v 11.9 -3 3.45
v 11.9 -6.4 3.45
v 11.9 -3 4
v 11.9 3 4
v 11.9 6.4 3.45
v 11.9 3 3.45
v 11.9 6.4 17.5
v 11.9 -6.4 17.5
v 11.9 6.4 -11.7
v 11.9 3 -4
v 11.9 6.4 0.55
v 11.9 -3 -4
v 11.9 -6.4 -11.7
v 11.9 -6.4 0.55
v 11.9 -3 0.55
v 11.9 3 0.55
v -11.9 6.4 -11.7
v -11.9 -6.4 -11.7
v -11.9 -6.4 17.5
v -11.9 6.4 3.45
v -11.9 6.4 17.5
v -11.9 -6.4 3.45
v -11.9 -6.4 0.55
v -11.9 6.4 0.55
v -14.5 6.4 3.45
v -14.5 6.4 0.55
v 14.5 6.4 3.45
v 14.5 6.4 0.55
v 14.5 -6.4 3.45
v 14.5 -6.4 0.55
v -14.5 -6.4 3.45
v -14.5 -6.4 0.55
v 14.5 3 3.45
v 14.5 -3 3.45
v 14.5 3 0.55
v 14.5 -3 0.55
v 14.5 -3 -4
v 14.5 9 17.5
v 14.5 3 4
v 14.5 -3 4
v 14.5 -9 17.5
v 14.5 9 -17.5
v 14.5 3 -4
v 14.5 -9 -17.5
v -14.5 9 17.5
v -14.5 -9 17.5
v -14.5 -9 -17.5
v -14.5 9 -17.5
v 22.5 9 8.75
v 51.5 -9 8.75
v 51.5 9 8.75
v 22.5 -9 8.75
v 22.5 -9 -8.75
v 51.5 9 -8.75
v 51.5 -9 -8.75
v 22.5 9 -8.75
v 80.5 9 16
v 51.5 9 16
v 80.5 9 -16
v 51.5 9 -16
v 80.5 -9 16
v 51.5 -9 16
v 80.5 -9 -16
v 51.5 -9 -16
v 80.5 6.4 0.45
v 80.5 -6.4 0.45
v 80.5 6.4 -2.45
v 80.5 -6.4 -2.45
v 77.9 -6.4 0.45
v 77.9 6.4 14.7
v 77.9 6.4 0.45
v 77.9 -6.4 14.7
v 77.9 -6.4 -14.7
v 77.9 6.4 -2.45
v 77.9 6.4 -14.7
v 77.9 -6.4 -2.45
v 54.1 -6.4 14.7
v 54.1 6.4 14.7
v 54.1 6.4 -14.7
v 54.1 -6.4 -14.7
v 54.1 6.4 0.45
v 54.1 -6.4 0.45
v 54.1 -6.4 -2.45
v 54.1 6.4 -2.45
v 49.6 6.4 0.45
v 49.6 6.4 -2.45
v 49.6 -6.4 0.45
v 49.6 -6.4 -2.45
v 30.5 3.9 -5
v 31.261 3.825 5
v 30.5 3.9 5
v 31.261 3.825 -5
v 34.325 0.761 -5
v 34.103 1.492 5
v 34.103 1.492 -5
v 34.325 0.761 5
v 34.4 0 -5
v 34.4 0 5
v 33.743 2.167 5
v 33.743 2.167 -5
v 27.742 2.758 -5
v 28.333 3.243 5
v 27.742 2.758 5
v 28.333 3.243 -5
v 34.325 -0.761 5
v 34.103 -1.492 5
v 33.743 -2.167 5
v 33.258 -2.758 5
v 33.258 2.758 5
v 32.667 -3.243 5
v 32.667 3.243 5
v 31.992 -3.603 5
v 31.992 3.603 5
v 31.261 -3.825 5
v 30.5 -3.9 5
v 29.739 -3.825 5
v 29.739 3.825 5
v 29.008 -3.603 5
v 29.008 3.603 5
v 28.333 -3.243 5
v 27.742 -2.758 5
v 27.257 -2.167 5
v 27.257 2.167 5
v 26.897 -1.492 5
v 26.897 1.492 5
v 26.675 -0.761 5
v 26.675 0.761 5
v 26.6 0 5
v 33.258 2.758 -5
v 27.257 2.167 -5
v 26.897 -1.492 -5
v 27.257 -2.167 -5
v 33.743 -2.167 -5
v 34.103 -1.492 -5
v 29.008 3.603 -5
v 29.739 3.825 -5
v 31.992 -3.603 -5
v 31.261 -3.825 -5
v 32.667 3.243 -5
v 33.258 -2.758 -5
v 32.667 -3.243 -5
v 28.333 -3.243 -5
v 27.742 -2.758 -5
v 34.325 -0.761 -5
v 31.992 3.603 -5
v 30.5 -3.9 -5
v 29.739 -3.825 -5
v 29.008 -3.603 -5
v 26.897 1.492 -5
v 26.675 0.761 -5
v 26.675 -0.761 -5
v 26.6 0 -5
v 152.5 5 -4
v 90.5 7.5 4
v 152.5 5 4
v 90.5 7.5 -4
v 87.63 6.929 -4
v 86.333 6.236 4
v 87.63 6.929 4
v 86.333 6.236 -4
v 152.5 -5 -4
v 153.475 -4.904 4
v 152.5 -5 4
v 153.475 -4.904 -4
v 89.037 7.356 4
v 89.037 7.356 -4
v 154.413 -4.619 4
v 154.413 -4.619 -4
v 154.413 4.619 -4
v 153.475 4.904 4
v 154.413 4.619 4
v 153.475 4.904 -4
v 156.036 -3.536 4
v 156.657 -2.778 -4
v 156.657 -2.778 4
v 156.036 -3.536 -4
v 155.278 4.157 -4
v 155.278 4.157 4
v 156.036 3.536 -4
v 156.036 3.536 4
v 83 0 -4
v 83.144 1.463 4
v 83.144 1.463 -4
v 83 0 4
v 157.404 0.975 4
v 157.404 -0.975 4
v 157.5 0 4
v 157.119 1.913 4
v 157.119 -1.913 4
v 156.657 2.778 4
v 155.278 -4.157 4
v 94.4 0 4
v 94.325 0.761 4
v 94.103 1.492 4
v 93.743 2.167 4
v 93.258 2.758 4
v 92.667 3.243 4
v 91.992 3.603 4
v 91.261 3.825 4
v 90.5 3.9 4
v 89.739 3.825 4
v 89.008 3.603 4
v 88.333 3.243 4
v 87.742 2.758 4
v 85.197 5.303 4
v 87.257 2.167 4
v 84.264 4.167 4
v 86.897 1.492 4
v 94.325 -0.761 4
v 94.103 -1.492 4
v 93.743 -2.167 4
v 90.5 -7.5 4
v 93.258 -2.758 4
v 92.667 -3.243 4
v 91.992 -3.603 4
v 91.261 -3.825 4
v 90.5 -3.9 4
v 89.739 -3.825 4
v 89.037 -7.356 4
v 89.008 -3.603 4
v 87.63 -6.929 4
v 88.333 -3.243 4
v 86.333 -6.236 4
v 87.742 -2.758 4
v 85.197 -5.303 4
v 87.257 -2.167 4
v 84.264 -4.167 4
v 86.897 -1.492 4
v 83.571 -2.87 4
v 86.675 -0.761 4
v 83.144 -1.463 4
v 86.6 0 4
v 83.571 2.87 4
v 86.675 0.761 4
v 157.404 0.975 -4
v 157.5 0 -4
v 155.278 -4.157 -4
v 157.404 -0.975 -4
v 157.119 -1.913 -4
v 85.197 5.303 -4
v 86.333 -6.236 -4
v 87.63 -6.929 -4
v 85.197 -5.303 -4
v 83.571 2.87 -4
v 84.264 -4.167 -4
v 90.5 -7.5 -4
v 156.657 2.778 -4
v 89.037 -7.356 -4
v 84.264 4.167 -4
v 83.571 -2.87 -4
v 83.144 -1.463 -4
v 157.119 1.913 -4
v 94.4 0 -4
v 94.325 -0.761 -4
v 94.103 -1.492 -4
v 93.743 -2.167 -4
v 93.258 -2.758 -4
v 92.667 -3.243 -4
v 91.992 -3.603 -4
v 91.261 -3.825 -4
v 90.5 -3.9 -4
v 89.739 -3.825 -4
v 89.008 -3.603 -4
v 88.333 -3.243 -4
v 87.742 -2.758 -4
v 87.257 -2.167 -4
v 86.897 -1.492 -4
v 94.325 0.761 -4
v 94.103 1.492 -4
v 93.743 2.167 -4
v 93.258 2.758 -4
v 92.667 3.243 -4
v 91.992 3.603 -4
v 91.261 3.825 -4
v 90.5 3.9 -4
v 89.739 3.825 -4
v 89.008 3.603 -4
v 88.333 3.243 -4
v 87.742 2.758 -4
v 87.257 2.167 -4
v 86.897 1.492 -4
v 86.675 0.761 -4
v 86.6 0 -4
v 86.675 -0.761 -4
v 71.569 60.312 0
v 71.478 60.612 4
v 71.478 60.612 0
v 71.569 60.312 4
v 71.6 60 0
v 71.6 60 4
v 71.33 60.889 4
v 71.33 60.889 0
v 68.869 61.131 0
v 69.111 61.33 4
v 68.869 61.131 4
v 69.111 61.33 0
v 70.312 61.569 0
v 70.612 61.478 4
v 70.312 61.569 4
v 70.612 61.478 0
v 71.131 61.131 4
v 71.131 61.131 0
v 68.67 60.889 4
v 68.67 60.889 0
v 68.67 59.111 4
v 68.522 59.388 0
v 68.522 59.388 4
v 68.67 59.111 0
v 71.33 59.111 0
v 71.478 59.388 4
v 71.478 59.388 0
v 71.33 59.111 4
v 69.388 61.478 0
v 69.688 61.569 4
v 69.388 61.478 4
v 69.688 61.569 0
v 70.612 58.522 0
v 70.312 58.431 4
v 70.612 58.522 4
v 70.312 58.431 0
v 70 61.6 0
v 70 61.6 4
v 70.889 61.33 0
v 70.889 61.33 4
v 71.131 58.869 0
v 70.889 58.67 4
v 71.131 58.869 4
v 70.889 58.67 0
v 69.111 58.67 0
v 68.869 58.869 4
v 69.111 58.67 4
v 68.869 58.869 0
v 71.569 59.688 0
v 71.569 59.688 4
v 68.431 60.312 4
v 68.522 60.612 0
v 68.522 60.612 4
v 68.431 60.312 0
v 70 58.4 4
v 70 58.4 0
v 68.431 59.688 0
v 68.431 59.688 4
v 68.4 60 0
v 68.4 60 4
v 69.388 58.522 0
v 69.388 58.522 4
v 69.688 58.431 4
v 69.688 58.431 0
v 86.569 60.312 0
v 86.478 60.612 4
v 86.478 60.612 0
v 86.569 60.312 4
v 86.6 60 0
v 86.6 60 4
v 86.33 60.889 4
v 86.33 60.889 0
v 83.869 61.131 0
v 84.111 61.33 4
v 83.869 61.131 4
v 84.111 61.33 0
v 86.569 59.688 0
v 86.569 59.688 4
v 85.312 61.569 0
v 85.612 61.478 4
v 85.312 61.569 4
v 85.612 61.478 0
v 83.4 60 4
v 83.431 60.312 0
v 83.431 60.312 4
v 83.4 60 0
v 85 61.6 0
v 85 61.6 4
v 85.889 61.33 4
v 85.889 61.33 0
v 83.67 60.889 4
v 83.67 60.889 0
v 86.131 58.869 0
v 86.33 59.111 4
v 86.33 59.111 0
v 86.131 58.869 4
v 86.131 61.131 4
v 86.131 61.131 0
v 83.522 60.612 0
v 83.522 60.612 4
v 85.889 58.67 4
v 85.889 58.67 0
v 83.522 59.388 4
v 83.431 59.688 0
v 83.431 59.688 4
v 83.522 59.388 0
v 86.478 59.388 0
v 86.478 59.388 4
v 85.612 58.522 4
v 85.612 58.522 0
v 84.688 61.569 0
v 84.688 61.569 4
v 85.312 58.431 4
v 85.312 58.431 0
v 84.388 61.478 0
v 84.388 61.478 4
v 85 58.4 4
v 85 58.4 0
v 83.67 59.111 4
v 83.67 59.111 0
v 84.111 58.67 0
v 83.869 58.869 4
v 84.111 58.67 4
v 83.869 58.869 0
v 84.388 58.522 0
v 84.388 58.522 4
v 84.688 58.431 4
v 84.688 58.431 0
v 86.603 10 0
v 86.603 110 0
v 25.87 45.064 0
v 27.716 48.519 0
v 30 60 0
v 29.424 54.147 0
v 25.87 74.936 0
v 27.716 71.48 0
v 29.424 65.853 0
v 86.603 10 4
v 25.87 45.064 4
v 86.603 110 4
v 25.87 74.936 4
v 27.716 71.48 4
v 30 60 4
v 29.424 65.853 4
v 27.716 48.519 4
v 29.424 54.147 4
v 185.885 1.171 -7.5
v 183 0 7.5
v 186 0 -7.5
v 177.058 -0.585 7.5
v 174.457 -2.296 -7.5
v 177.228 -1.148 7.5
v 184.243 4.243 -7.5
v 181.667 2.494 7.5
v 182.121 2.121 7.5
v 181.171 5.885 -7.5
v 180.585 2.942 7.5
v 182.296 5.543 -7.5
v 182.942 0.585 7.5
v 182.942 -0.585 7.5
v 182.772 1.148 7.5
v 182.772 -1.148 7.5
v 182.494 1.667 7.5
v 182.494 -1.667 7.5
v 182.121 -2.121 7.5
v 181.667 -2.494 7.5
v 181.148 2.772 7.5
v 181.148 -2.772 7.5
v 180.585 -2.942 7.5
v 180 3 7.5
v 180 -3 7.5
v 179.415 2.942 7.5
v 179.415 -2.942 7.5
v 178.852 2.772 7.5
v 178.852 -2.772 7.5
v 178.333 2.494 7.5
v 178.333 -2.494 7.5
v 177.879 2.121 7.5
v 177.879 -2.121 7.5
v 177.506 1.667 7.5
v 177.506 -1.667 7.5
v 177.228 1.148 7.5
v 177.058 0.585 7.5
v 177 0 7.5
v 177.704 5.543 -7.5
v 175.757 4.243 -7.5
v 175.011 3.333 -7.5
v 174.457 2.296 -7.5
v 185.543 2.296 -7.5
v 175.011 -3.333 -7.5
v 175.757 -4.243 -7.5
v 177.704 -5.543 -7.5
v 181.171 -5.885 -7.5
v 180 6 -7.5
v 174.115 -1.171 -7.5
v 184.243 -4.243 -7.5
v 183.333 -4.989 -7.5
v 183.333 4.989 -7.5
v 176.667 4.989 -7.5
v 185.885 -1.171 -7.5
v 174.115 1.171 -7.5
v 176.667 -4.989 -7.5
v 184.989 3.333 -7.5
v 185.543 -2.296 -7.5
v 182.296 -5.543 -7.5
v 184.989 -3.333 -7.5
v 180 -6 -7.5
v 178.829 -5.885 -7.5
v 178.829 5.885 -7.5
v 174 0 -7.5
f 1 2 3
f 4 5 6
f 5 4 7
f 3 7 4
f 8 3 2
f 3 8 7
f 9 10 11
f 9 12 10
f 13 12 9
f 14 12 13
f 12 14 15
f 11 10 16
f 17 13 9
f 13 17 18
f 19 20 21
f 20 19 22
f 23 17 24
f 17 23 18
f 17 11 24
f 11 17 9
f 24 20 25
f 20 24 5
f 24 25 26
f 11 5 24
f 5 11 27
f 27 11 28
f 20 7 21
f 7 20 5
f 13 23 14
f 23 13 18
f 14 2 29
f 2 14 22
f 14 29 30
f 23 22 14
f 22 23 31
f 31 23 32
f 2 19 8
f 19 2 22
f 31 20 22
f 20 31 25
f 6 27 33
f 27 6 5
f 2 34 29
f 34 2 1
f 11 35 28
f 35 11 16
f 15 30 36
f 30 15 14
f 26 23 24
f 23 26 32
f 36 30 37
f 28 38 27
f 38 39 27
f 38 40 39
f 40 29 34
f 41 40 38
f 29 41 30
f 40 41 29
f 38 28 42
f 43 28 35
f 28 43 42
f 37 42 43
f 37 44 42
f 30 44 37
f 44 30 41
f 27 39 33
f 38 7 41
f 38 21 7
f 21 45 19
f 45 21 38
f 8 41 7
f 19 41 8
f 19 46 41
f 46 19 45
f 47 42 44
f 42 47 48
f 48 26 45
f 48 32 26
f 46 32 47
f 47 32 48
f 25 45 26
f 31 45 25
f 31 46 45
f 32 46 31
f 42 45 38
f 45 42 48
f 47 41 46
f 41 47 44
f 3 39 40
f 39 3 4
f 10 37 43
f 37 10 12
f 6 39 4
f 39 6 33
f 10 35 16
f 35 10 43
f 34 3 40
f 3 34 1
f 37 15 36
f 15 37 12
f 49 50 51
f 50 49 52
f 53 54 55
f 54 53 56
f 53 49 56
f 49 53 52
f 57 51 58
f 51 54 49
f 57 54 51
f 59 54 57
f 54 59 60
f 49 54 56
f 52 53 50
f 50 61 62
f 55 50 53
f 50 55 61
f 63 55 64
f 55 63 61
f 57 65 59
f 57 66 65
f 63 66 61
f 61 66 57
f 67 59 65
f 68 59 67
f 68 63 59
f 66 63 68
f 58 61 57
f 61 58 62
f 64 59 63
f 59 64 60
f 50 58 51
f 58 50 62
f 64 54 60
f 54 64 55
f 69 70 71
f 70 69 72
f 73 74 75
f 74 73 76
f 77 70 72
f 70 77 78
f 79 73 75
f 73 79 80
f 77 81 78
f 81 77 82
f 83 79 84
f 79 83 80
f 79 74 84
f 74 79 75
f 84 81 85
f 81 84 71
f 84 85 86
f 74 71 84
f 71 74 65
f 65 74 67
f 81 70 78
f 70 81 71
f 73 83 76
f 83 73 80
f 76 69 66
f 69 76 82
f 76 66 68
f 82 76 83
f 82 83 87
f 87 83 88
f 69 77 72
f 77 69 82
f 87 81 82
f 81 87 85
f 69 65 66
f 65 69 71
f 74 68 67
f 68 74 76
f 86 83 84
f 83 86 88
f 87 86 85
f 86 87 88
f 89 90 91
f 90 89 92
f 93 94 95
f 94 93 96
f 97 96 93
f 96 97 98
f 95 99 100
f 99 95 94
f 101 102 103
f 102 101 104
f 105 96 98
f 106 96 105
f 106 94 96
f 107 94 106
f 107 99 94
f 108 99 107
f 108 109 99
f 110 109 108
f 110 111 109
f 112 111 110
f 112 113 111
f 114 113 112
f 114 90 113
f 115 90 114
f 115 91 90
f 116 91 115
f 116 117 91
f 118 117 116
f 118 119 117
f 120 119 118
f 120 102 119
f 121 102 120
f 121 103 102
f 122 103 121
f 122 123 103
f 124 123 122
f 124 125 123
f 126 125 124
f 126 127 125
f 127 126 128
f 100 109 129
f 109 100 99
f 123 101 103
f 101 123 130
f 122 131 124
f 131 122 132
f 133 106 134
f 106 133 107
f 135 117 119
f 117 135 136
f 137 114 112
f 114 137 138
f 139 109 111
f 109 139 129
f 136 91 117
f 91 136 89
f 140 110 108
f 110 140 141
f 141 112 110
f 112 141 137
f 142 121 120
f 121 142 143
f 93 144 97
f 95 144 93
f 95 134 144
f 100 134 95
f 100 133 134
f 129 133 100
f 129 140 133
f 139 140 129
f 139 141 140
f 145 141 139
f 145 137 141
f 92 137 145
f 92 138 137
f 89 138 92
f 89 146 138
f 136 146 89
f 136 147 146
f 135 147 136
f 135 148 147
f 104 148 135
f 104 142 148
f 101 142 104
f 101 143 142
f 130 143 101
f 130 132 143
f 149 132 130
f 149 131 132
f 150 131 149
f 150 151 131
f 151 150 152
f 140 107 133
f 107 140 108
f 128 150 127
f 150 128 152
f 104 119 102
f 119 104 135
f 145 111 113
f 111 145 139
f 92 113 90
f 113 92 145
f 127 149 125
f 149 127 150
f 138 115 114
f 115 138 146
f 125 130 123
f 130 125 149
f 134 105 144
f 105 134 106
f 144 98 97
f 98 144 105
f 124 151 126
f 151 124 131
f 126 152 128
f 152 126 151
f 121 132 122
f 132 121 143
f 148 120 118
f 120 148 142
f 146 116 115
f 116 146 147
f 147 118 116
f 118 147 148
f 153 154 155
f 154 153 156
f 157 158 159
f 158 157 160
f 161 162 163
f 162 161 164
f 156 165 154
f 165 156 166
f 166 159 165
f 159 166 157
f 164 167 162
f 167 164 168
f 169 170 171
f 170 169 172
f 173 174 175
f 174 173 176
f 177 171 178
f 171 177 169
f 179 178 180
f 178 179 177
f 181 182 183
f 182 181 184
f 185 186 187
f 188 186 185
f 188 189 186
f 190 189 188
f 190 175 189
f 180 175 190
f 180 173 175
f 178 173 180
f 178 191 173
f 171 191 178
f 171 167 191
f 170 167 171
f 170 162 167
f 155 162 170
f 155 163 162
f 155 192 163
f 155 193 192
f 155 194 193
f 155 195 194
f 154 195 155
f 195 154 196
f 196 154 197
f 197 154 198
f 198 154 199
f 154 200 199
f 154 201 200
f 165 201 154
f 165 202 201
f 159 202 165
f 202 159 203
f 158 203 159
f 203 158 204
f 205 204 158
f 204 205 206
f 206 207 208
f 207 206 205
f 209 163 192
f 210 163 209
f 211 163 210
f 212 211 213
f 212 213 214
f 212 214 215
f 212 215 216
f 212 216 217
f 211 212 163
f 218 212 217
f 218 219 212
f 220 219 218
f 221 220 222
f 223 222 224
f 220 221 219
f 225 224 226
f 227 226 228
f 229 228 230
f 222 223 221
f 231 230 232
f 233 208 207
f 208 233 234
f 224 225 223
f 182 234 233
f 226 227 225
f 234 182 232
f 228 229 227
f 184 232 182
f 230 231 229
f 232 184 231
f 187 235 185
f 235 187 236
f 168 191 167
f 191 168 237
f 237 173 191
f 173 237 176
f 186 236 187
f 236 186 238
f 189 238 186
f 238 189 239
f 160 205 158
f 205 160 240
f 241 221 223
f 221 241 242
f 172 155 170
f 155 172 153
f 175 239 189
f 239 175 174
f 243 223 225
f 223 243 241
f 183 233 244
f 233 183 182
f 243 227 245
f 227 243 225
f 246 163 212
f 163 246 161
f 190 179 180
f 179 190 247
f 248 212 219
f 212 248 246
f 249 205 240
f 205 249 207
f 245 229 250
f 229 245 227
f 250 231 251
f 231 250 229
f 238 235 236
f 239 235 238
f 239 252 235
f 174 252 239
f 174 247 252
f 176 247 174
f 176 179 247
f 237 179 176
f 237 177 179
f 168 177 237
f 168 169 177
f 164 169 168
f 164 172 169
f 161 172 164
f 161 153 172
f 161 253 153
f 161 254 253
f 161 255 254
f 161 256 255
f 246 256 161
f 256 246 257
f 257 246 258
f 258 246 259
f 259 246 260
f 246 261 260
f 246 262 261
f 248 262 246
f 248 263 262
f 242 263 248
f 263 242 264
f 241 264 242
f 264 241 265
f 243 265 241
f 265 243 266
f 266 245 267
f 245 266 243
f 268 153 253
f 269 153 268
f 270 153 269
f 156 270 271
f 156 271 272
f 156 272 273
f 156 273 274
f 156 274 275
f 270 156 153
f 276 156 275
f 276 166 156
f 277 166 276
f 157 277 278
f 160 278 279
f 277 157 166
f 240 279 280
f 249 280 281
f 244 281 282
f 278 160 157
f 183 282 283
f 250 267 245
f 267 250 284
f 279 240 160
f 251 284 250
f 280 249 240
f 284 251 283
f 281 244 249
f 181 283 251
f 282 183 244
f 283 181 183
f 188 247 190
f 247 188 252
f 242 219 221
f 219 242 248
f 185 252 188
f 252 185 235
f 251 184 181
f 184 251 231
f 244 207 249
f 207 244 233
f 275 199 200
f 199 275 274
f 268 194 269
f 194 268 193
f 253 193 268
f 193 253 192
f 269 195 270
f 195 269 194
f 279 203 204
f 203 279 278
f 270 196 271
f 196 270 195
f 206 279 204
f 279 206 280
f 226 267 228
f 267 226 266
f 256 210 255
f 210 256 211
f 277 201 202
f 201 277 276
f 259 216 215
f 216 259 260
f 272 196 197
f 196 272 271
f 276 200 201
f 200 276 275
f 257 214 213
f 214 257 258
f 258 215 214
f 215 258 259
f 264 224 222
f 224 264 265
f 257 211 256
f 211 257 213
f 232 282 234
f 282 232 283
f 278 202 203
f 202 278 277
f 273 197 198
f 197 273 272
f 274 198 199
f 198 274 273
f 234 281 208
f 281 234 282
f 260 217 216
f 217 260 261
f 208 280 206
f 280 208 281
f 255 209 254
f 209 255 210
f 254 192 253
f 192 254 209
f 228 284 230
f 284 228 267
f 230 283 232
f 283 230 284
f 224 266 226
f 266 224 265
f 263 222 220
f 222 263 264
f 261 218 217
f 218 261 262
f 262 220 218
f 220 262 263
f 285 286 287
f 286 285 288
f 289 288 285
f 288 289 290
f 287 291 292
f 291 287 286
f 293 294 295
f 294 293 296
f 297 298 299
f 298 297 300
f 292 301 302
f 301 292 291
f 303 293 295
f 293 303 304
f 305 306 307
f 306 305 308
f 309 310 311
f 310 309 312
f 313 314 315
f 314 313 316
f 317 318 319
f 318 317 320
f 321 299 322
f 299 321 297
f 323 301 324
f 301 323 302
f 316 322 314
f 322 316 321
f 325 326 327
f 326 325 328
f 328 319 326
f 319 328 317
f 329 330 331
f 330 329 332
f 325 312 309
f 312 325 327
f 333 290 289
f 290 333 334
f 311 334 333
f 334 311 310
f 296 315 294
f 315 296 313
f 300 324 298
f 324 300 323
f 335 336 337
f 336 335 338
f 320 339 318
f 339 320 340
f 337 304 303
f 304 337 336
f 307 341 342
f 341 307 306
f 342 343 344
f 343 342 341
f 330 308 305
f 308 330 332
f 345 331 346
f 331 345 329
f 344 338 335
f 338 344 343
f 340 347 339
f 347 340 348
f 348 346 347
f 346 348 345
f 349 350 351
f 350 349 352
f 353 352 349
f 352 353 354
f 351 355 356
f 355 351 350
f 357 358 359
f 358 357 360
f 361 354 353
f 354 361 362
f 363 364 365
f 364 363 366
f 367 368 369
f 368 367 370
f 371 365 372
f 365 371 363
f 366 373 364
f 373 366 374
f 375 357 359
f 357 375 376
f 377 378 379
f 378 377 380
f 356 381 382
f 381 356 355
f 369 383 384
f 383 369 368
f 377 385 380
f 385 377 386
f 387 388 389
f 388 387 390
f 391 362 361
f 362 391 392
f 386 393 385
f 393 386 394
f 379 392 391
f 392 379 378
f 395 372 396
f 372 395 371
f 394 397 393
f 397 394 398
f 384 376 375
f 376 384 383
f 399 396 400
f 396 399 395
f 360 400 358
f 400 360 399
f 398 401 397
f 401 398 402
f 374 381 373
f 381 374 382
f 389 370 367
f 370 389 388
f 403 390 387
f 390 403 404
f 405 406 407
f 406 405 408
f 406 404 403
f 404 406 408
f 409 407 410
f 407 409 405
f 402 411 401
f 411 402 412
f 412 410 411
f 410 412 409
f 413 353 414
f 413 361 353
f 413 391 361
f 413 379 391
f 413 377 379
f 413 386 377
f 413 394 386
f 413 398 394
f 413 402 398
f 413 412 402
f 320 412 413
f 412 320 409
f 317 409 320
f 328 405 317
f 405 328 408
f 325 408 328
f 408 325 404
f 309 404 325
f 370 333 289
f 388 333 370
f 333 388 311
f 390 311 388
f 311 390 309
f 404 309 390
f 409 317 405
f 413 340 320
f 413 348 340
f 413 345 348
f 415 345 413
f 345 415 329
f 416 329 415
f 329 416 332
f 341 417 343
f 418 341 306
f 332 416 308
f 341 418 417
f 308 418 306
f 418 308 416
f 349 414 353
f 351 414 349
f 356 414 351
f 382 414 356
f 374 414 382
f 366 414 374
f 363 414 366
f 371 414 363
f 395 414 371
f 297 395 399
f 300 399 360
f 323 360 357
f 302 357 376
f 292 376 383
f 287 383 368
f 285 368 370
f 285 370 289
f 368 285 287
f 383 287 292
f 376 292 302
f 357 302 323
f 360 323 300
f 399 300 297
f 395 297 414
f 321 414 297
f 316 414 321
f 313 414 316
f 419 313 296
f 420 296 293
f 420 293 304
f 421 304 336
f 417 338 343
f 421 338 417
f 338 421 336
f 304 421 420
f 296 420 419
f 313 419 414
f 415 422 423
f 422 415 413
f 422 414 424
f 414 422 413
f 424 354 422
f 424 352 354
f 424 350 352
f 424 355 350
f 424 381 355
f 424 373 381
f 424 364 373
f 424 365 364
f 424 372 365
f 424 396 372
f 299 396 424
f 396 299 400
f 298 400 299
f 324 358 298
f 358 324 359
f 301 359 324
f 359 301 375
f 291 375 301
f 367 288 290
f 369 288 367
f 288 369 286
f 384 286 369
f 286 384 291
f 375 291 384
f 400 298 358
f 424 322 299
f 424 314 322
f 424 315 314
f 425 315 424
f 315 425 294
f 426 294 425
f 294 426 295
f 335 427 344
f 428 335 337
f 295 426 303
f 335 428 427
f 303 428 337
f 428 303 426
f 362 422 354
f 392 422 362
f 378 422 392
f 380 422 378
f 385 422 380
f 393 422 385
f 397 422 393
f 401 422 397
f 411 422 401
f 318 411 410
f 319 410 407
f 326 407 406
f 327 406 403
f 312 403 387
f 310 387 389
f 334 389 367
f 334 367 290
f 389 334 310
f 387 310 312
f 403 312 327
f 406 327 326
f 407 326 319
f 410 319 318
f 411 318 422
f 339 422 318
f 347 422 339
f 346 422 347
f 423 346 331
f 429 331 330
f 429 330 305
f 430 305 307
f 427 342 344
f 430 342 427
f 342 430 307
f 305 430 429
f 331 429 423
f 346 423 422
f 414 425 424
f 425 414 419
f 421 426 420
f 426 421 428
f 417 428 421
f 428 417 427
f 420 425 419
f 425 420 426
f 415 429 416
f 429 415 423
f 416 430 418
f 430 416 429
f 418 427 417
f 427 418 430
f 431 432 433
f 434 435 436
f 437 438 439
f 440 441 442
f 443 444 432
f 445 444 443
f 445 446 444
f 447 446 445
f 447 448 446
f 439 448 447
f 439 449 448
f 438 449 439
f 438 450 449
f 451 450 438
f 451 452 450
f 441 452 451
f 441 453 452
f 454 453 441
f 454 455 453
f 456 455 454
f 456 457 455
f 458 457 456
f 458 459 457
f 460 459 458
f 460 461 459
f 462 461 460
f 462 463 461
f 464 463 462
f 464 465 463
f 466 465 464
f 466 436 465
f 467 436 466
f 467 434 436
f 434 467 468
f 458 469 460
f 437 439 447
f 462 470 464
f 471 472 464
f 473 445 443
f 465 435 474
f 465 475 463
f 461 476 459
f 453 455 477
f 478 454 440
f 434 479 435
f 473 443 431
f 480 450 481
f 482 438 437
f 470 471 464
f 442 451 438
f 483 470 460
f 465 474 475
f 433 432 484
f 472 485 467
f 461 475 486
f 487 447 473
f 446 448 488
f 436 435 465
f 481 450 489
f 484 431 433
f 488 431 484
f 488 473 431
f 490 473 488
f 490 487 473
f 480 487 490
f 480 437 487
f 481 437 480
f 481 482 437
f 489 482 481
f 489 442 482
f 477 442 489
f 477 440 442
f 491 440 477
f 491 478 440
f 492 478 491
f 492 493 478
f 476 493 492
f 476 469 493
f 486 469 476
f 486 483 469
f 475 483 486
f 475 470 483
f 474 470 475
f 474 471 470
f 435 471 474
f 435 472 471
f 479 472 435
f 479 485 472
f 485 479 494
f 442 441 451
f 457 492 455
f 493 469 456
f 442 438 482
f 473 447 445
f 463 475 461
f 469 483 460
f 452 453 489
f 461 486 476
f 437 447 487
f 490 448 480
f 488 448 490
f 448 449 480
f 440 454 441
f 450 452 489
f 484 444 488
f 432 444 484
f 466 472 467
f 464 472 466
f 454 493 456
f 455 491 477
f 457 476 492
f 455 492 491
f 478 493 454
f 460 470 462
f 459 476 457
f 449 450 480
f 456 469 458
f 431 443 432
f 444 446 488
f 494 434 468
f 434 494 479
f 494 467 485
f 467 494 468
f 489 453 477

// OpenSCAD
// Hexapod Leg - Parametric OpenSCAD Design
// Designed for SG90 servos (all 18 joints)

/* [Servo Dimensions] */
// SG90 micro servo
sg90_width = 12;
sg90_length = 23;
sg90_height = 29;
sg90_shaft_height = 4;
sg90_ear_width = 32;
sg90_ear_thickness = 2.5;
sg90_ear_offset = 15.5;  // from bottom

// HS-82MG servo (slightly larger)
hs82_width = 12;
hs82_length = 30;
hs82_height = 30;
hs82_shaft_height = 4;
hs82_ear_width = 40;
hs82_ear_thickness = 2.5;
hs82_ear_offset = 17;

/* [Leg Dimensions] */
coxa_length = 25;
femur_length = 55;
tibia_length = 75;
wall_thickness = 3;
clearance = 0.4;  // printer tolerance (increased for MG90S compatibility)

/* [Rendering] */
$fn = 32;

// Servo pocket module (for embedding servo)
module servo_pocket(type="sg90") {
    w = (type == "sg90") ? sg90_width : hs82_width;
    l = (type == "sg90") ? sg90_length : hs82_length;
    h = (type == "sg90") ? sg90_height : hs82_height;
    ear_w = (type == "sg90") ? sg90_ear_width : hs82_ear_width;
    ear_t = (type == "sg90") ? sg90_ear_thickness : hs82_ear_thickness;
    ear_off = (type == "sg90") ? sg90_ear_offset : hs82_ear_offset;

    c = clearance;

    union() {
        // Main body
        cube([l + c*2, w + c*2, h + c], center=true);
        // Mounting ears
        translate([0, 0, h/2 - ear_off])
            cube([ear_w + c*2, w + c*2, ear_t + c], center=true);
    }
}

// Horn/shaft hole
module shaft_hole(d=7, h=10) {
    cylinder(d=d + clearance*2, h=h, center=true);
}

// Coxa bracket - mounts SG90 for hip rotation
module coxa_bracket() {
    bracket_h = sg90_height + wall_thickness * 2;
    bracket_w = sg90_width + wall_thickness * 2;
    bracket_l = sg90_length + wall_thickness * 2;

    difference() {
        // Outer shell
        cube([bracket_l, bracket_w, bracket_h], center=true);

        // Servo pocket
        translate([0, 0, wall_thickness])
            servo_pocket("sg90");

        // Shaft hole (top)
        translate([0, 0, bracket_h/2 - 2])
            shaft_hole();

        // Wire channel
        translate([bracket_l/2, 0, 0])
            cube([wall_thickness*2, 6, 8], center=true);
    }
}

// Femur link - connects coxa to tibia
module femur_link() {
    link_w = sg90_width + wall_thickness * 2;
    link_h = sg90_height/2 + wall_thickness;

    difference() {
        union() {
            // Main beam
            cube([femur_length, link_w, link_h], center=true);

            // Servo mount end
            translate([femur_length/2 - sg90_length/2, 0, 0])
                cube([sg90_length + wall_thickness*2, link_w, sg90_height + wall_thickness], center=true);
        }

        // Servo pocket at end
        translate([femur_length/2 - sg90_length/2, 0, 0])
            servo_pocket("sg90");

        // Horn attachment hole (other end)
        translate([-femur_length/2 + 8, 0, 0])
            shaft_hole();
    }
}

// Tibia link - lower leg segment
module tibia_link() {
    link_w = 15;
    link_h = 8;

    difference() {
        union() {
            // Main beam
            hull() {
                translate([-tibia_length/2 + 8, 0, 0])
                    cylinder(d=link_w, h=link_h, center=true);
                translate([tibia_length/2 - 5, 0, 0])
                    cylinder(d=10, h=link_h, center=true);
            }
        }

        // Horn attachment hole
        translate([-tibia_length/2 + 8, 0, 0])
            shaft_hole();
    }
}

// Foot tip (print in TPU for grip)
module foot_tip() {
    cylinder(d1=12, d2=6, h=15, center=true);
}

// Body mount plate (1/6 segment)
module body_segment() {
    seg_angle = 60;
    inner_r = 30;
    outer_r = 100;
    thickness = 4;

    difference() {
        // Wedge shape
        linear_extrude(height=thickness)
            polygon([
                [0, 0],
                [outer_r * cos(seg_angle/2), outer_r * sin(seg_angle/2)],
                [outer_r * cos(-seg_angle/2), outer_r * sin(-seg_angle/2)]
            ]);

        // Inner cutout
        translate([0, 0, -1])
            cylinder(r=inner_r, h=thickness+2);

        // Coxa mount holes
        translate([70, 0, -1]) {
            cylinder(d=3.2, h=thickness+2);
            translate([15, 0, 0])
                cylinder(d=3.2, h=thickness+2);
        }
    }
}

// Preview all parts
module preview() {
    color("DarkGray") coxa_bracket();
    color("Gray") translate([50, 0, 0]) femur_link();
    color("LightGray") translate([120, 0, 0]) tibia_link();
    color("Black") translate([180, 0, 0]) foot_tip();
    color("Blue", 0.5) translate([0, 60, 0]) body_segment();
}

// Uncomment to render individual parts for printing:
// coxa_bracket();
// femur_link();
// tibia_link();
// foot_tip();
// body_segment();

preview();
